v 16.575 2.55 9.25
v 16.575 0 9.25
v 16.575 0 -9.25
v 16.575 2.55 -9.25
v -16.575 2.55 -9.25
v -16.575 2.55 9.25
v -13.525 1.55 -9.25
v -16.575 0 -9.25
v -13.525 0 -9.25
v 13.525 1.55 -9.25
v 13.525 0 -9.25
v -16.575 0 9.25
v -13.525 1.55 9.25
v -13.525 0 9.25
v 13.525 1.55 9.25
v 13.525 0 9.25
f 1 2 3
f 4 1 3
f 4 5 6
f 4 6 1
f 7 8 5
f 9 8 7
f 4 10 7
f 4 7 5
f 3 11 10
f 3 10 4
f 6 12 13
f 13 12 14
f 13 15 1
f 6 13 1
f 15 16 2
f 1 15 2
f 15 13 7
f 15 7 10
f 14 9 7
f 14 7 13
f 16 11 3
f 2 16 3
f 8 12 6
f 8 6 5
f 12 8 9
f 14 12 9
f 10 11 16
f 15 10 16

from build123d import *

# Parameters (mm, degrees)
SKETCH1_W           = 33.15
SKETCH1_H           = 18.5
BOSS_EXTRUDE1_DEPTH = 2.55
SKETCH2_W           = 27.05
SKETCH2_H           = 18.5
CUT_EXTRUDE1_DEPTH  = 1.55


with BuildPart() as part:
    # Sketch1 → Boss-Extrude1 (new body)
    with BuildSketch(Plane(origin=(0, 0, 0), x_dir=(1, 0, 0), z_dir=(0, 1, 0))):
        Rectangle(SKETCH1_W, SKETCH1_H)
    extrude(amount=BOSS_EXTRUDE1_DEPTH)

    # Sketch2 → Cut-Extrude1 (cut)
    with BuildSketch(Plane.XZ):
        Rectangle(SKETCH2_W, SKETCH2_H)
    extrude(amount=-CUT_EXTRUDE1_DEPTH, mode=Mode.SUBTRACT)


solid = part.part
